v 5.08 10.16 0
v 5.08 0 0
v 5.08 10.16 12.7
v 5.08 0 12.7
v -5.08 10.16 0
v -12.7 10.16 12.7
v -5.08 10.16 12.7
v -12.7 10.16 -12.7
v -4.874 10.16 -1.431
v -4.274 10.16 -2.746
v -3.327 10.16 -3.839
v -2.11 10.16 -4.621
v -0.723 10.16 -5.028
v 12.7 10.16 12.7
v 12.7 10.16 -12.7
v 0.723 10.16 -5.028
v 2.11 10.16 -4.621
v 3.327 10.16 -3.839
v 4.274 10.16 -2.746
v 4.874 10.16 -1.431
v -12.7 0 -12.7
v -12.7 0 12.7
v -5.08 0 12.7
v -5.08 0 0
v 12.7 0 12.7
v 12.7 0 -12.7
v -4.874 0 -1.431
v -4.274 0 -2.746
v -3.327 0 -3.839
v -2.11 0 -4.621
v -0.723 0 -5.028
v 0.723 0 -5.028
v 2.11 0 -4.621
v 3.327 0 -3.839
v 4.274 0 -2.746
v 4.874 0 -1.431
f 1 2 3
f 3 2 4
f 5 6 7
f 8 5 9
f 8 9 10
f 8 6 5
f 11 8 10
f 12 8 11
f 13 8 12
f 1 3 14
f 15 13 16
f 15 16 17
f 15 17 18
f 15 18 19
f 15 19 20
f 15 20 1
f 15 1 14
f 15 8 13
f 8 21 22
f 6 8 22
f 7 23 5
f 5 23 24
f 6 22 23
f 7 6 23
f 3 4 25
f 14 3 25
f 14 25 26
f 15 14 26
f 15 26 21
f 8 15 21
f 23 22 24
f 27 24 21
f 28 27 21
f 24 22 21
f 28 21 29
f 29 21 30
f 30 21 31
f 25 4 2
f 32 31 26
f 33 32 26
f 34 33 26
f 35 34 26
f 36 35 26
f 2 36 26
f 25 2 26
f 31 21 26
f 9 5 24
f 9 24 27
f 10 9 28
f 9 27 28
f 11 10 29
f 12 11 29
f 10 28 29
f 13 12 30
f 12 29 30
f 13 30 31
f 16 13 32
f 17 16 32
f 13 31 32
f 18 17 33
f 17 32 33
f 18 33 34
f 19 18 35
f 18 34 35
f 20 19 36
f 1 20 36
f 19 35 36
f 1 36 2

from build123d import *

# Parameters (mm, degrees)
BOSS_EXTRUDE1_DEPTH = 10.16


with BuildPart() as part:
    # Sketch1 → Boss-Extrude1 (new body)
    with BuildSketch(Plane(origin=(0, 0, 0), x_dir=(1, 0, 0), z_dir=(0, 1, 0))):
        with BuildLine():
            Line((-5.08, -12.7), (-5.08, 0))
            ThreePointArc((-5.08, 0), (0, 5.08), (5.08, 0))
            Line((5.08, 0), (5.08, -12.7))
            Line((5.08, -12.7), (12.7, -12.7))
            Line((12.7, -12.7), (12.7, 12.7))
            Line((12.7, 12.7), (-12.7, 12.7))
            Line((-12.7, 12.7), (-12.7, -12.7))
            Line((-12.7, -12.7), (-5.08, -12.7))
        make_face()
    extrude(amount=BOSS_EXTRUDE1_DEPTH)


solid = part.part
